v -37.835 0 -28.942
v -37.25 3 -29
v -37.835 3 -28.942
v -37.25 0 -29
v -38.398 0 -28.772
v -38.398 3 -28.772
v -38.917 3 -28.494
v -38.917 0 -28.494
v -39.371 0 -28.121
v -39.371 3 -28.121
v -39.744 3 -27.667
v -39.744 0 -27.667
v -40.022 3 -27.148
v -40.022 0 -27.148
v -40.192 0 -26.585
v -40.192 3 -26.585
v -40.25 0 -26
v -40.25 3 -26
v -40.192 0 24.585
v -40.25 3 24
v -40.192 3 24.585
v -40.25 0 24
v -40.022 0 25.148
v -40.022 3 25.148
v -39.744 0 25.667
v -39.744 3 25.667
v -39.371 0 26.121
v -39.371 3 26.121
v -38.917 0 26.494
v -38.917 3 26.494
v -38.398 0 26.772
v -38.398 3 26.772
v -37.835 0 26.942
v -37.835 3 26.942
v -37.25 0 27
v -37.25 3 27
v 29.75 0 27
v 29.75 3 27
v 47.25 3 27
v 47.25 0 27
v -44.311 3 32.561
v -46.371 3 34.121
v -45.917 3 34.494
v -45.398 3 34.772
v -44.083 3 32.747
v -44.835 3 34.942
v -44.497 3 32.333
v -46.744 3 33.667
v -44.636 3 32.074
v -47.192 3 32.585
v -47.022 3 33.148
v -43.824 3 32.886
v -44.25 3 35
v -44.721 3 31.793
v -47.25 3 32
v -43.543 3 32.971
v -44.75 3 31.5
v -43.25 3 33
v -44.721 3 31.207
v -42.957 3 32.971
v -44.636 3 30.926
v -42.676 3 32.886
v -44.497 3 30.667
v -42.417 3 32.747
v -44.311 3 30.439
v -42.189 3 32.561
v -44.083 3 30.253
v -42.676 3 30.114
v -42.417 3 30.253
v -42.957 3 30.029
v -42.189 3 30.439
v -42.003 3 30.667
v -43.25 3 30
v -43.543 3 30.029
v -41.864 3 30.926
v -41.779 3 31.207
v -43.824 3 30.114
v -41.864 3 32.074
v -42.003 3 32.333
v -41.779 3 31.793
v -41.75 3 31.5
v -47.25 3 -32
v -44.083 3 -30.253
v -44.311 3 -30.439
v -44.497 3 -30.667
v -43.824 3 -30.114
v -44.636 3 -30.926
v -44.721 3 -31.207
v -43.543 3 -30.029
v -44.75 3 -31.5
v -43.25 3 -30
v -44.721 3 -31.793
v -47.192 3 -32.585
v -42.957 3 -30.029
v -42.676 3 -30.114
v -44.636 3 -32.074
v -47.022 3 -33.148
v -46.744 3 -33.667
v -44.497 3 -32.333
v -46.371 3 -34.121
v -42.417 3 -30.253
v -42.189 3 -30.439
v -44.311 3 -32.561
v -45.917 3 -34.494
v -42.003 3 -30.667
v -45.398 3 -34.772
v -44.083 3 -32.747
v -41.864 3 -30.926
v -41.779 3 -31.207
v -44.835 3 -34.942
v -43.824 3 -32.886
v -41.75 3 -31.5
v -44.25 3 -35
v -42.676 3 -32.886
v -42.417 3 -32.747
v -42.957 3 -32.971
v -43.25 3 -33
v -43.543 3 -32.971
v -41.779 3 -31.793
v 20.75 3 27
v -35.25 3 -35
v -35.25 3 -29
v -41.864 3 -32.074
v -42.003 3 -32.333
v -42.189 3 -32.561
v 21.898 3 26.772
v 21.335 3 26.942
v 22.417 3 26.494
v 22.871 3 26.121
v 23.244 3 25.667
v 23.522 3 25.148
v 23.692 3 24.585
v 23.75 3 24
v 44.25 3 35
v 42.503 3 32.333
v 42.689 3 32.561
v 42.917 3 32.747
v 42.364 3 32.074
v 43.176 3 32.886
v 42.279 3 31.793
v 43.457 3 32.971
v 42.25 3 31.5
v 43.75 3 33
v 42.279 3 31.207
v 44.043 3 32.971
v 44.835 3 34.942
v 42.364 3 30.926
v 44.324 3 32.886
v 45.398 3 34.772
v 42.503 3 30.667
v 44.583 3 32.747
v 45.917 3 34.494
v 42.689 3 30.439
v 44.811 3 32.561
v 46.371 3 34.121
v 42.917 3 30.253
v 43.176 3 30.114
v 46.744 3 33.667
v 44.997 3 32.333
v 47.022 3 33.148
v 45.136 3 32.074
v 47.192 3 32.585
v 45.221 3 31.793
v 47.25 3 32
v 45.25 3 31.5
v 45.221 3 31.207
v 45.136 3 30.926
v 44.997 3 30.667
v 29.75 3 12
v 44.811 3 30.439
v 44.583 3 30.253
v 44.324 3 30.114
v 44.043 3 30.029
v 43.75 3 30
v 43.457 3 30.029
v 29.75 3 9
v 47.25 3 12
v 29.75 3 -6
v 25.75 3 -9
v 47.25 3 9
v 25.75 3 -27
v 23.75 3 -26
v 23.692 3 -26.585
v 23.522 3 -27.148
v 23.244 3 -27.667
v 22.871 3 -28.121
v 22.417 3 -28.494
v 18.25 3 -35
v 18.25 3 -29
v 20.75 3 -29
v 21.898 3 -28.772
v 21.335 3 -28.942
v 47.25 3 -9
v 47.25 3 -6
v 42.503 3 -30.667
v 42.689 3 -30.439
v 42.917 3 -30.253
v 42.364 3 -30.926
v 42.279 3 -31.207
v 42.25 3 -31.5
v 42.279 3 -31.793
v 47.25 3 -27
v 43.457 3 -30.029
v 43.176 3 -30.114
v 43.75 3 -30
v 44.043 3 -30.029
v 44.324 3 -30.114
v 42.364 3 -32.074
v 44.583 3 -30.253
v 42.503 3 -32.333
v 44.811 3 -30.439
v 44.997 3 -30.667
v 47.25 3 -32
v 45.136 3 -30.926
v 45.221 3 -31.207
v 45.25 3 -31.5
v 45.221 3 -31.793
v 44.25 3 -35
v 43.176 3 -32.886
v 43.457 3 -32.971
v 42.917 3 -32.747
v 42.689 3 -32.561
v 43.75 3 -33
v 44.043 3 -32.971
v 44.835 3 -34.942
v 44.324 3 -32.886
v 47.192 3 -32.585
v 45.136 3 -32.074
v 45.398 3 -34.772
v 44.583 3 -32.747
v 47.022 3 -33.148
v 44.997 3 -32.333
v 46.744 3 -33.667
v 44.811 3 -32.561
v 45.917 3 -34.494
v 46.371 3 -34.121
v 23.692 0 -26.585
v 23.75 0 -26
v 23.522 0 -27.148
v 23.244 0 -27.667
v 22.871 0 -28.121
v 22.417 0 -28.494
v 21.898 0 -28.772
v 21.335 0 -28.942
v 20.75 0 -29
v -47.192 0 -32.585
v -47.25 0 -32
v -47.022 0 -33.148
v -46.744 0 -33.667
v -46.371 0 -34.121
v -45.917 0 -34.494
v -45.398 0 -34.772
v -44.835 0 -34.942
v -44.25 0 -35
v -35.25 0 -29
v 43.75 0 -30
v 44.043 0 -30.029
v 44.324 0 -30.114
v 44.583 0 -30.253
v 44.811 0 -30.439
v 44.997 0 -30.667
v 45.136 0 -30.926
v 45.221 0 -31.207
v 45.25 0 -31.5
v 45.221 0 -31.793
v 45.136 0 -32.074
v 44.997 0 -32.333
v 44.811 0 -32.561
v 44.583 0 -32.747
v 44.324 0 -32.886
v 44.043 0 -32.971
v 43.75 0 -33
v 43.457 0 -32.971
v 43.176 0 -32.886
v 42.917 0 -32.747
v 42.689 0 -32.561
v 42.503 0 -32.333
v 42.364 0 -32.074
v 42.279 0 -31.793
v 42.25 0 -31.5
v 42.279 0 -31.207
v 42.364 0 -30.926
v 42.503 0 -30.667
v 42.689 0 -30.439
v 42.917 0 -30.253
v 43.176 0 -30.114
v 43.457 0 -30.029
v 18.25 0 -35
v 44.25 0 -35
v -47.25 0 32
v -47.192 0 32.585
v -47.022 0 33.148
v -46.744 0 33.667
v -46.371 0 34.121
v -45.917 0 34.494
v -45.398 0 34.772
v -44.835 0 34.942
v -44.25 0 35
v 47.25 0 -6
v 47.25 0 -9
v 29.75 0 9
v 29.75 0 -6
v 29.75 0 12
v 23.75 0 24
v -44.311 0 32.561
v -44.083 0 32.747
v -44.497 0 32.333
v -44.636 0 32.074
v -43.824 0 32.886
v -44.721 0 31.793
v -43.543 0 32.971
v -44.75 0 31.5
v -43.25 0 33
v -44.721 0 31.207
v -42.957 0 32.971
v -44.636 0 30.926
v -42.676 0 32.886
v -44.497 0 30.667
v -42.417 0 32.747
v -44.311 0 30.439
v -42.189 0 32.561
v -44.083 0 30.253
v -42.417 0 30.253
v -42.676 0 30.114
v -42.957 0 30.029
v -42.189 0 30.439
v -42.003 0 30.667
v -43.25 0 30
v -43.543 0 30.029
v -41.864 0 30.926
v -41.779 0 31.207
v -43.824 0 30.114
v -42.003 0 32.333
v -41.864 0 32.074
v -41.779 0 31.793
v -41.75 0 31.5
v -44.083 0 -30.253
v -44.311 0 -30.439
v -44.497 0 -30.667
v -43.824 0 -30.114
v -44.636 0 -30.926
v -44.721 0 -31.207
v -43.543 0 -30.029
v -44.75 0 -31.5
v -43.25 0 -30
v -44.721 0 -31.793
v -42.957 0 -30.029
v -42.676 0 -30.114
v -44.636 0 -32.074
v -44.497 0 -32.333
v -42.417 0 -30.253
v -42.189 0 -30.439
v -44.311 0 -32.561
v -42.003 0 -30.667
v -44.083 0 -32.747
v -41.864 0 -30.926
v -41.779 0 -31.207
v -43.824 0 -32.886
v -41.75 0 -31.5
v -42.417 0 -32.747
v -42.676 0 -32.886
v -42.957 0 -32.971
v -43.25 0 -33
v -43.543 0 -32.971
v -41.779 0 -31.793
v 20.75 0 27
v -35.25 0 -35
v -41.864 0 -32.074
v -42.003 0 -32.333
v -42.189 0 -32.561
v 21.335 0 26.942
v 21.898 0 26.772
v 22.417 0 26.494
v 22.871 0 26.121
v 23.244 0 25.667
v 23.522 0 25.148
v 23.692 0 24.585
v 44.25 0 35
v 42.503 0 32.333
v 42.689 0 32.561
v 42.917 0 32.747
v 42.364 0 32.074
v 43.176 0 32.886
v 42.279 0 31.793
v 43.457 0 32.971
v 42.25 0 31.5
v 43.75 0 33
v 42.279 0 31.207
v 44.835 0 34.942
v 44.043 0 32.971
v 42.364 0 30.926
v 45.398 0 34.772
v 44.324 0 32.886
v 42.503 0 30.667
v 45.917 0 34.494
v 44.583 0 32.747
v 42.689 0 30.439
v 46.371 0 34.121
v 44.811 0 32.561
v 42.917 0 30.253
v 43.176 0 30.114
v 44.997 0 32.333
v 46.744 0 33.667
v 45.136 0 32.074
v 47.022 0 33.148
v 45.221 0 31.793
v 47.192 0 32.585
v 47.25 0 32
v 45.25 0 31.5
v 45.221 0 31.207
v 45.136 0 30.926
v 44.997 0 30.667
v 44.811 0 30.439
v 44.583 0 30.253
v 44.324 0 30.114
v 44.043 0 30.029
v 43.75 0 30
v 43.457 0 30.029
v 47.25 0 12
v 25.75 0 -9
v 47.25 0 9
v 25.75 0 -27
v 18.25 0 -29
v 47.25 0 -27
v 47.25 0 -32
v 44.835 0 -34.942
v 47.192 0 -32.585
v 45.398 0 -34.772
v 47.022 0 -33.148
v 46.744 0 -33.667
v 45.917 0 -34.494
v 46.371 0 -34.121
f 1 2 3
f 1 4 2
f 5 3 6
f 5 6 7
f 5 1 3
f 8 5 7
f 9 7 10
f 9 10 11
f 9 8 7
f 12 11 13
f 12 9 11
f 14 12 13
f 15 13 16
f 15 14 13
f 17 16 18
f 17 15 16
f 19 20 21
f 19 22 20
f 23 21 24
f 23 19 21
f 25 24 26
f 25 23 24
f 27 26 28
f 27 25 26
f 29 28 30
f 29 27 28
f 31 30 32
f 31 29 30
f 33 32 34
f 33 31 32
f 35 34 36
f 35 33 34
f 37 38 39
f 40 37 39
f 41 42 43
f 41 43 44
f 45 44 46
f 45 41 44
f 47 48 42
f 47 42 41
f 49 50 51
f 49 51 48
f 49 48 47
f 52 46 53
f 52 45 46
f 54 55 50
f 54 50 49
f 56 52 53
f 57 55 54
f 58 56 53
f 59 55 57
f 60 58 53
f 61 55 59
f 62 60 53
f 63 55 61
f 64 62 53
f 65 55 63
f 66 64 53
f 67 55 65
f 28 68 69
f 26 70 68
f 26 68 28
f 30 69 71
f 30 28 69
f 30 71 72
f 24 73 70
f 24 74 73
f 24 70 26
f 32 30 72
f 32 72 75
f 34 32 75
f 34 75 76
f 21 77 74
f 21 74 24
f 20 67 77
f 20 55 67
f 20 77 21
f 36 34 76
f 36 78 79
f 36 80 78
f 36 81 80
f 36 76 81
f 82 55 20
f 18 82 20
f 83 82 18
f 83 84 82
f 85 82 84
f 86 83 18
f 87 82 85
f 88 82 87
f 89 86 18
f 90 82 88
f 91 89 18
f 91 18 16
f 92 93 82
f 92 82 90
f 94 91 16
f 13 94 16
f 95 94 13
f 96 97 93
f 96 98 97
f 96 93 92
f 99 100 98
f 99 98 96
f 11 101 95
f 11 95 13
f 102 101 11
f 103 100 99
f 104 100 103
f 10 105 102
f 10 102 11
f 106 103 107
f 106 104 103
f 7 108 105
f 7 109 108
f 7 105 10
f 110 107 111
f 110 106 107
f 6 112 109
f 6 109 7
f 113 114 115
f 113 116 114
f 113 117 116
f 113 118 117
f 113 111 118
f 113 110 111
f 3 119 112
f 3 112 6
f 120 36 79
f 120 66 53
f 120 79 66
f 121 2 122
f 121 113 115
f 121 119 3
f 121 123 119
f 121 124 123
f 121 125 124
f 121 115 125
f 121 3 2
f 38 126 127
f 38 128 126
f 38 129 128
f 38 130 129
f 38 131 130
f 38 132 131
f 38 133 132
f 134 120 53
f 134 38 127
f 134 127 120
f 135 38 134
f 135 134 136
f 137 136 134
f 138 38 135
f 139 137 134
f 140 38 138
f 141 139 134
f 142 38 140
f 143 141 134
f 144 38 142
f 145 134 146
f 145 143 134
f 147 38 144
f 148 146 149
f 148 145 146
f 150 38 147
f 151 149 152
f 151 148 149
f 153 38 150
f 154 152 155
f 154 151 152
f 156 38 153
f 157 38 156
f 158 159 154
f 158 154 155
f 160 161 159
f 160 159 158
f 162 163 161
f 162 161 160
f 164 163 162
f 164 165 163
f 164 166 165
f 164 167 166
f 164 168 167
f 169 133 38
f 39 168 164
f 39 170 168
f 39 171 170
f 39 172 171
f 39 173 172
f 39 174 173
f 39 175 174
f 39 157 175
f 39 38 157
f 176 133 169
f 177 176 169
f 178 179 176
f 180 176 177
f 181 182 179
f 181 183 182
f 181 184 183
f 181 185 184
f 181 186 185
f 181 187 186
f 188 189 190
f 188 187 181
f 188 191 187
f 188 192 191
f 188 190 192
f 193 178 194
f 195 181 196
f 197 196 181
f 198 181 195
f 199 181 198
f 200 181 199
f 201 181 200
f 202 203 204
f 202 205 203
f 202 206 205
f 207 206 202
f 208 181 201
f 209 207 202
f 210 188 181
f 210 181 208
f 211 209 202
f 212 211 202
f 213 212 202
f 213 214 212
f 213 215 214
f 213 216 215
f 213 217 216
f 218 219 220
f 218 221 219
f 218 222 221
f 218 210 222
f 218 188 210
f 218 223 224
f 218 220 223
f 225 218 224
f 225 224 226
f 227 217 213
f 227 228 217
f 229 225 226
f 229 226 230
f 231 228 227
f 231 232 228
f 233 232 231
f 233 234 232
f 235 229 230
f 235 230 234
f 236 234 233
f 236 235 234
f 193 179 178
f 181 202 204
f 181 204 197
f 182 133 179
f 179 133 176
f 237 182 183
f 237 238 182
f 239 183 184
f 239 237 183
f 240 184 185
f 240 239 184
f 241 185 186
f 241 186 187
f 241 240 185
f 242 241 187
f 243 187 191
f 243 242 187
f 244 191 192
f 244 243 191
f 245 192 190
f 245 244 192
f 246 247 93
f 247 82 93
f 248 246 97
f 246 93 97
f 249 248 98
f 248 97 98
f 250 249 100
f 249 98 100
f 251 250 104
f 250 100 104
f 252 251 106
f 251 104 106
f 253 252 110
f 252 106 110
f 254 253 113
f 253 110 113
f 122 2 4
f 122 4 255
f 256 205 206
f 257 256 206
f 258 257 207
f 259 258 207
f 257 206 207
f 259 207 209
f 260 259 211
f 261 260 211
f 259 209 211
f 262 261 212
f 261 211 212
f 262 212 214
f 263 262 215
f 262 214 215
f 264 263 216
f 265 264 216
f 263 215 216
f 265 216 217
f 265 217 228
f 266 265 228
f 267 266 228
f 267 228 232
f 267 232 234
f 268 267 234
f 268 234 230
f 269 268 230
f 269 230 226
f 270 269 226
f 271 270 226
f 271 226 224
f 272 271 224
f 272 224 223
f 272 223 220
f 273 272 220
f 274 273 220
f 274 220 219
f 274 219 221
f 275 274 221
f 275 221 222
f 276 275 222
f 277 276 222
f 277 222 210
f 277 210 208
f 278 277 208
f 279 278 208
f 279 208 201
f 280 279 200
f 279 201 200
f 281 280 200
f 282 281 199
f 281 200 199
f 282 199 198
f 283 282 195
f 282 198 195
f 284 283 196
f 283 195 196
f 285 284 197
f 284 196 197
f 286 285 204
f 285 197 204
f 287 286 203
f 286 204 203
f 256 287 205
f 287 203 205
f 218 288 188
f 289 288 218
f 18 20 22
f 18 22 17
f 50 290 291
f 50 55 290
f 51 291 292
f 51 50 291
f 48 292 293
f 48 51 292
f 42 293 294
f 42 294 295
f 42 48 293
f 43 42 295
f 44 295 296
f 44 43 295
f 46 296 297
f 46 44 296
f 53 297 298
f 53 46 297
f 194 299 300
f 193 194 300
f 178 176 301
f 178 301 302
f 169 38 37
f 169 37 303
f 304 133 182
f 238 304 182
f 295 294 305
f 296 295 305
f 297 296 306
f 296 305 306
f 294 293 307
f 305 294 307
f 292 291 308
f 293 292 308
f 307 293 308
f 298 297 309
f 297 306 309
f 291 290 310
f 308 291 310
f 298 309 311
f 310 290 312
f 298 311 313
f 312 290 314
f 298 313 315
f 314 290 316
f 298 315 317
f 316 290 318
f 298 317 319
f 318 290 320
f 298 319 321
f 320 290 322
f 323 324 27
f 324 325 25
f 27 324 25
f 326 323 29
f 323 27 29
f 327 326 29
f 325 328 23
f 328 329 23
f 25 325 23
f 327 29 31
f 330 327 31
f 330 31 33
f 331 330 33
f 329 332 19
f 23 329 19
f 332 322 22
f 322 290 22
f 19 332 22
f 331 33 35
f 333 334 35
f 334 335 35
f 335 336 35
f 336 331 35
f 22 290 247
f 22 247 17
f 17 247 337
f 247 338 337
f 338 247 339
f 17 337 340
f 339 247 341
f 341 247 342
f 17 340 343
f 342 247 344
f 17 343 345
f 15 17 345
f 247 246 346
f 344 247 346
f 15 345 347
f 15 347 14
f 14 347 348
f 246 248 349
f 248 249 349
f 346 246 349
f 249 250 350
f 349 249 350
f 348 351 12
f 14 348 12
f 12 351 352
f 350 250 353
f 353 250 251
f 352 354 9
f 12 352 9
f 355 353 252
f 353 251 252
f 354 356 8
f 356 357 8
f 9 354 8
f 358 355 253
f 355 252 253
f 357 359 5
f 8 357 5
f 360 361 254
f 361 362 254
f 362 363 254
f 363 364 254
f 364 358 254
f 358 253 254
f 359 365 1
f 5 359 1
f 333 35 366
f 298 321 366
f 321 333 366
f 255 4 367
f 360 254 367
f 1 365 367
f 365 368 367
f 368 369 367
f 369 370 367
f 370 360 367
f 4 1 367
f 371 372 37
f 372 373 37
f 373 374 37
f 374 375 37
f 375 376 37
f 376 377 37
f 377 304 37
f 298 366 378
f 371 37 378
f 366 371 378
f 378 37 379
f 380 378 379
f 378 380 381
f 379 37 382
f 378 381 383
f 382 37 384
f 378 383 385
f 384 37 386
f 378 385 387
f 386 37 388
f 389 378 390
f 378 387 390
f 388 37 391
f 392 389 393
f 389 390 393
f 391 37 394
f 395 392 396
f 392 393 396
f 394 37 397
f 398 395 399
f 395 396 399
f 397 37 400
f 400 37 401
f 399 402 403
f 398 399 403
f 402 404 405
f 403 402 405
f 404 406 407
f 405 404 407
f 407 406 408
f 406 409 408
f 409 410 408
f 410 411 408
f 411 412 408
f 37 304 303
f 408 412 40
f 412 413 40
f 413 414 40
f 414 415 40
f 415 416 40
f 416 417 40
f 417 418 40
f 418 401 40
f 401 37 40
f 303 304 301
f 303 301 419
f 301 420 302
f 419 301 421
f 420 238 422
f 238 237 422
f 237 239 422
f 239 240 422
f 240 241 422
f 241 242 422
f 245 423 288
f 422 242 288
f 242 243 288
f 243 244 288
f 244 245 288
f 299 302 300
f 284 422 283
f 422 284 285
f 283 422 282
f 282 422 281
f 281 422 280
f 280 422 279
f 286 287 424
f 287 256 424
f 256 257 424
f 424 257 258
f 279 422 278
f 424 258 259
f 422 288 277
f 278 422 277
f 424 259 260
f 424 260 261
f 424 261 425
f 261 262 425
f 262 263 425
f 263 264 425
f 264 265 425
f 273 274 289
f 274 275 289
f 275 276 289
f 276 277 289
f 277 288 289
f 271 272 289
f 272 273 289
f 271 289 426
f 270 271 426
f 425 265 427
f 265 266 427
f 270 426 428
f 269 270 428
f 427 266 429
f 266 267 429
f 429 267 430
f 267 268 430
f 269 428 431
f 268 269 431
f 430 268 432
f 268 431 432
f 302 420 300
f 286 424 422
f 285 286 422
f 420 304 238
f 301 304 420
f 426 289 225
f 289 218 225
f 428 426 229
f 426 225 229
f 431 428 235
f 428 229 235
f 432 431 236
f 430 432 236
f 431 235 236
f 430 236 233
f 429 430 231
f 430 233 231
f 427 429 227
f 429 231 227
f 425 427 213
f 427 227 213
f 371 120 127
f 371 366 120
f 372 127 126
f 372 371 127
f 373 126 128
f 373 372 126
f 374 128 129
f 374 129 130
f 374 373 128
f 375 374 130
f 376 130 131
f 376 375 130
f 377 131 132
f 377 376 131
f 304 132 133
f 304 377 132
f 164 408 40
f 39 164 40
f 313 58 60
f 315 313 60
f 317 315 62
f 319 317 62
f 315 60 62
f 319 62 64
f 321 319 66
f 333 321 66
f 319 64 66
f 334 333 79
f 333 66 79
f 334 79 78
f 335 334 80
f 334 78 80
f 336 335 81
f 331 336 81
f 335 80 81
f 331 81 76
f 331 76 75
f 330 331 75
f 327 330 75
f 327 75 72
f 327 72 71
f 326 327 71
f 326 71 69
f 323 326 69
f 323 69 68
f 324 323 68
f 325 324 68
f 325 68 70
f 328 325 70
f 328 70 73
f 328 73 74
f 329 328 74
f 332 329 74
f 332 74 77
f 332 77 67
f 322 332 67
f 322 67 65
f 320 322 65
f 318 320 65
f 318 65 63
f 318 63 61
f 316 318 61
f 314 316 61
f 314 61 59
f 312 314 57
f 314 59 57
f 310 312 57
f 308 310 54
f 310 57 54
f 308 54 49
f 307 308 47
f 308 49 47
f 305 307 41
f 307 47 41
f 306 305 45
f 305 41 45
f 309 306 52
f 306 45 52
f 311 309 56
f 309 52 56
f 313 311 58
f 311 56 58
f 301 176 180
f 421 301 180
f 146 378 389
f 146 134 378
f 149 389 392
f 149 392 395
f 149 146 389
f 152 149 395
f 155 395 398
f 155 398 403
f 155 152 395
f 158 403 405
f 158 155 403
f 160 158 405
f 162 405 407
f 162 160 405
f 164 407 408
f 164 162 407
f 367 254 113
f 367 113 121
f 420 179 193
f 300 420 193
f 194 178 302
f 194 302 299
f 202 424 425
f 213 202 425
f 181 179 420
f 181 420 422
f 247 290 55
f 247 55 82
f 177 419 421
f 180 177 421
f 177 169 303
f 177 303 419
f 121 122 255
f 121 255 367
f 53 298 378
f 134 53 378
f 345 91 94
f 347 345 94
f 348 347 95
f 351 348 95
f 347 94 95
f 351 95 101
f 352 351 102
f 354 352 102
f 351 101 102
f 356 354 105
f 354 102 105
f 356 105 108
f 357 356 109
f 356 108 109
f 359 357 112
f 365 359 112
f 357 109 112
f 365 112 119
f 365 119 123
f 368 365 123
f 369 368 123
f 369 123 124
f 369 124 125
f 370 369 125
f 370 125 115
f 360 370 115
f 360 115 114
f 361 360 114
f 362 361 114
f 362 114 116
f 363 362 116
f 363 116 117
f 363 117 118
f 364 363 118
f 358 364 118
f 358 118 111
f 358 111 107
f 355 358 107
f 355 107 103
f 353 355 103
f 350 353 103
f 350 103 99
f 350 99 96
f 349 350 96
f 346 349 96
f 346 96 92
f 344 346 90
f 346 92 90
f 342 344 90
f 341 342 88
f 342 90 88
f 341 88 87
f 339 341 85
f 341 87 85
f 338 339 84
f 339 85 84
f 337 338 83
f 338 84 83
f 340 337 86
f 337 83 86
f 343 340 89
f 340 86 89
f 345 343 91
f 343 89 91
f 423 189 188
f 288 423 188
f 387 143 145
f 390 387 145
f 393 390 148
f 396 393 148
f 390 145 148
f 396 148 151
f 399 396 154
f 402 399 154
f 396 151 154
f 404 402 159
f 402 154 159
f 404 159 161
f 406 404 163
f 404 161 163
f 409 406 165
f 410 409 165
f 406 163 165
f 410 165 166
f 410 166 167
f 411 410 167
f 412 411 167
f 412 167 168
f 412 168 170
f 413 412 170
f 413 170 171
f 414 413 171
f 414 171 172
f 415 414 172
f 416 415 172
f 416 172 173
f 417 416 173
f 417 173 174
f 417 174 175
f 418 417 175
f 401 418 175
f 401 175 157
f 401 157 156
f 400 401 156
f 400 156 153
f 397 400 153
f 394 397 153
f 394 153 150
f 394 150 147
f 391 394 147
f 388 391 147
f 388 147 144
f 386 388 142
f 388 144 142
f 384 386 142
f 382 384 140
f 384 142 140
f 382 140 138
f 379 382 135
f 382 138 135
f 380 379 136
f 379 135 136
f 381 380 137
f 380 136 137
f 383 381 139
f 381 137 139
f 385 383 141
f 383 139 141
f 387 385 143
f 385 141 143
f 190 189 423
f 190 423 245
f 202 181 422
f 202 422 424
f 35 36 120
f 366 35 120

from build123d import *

# Parameters (mm, degrees)
SKETCH1_W           = 94.5
SKETCH1_H           = 70
BOSS_EXTRUDE1_DEPTH = 3
SKETCH3_R           = 1.5
CUT_EXTRUDE2_DEPTH  = 59.877521177
FILLET2_R           = 3
SKETCH5_W           = 64
SKETCH5_H           = 56
SKETCH5_W_2         = 53.5
SKETCH5_H_2         = 6
SKETCH5_W_3         = 21.5
SKETCH5_H_3         = 18
SKETCH5_W_4         = 17.5
SKETCH5_H_4         = 15
CUT_EXTRUDE3_DEPTH  = 59.877521177
FILLET3_R           = 3


with BuildPart() as part:
    # Sketch1 → Boss-Extrude1 (new body)
    with BuildSketch(Plane(origin=(0, 0, 0), x_dir=(1, 0, 0), z_dir=(0, 1, 0))):
        Rectangle(SKETCH1_W, SKETCH1_H)
    extrude(amount=BOSS_EXTRUDE1_DEPTH)

    # Sketch3 → Cut-Extrude2 (cut, through all)
    with BuildSketch(Plane(origin=(0, 3, 0), x_dir=(1, 0, 0), z_dir=(0, 1, 0))):
        with Locations(Location((43.75, 31.5, 0), (0, 0, 270))):
            Circle(SKETCH3_R)
        with Locations(Location((-43.25, 31.5, 0), (0, 0, 270))):
            Circle(SKETCH3_R)
        with Locations(Location((-43.25, -31.5, 0), (0, 0, 270))):
            Circle(SKETCH3_R)
        with Locations(Location((43.75, -31.5, 0), (0, 0, 270))):
            Circle(SKETCH3_R)
    extrude(amount=-CUT_EXTRUDE2_DEPTH, mode=Mode.SUBTRACT)

    # Fillet2
    fillet2_edges = [part.edges().sort_by_distance(p)[0] for p in [
        (47.25, 1.5, 35),
        (-47.25, 1.5, 35),
        (-47.25, 1.5, -35),
        (47.25, 1.5, -35),
    ]]
    fillet(fillet2_edges, radius=FILLET2_R)

    # Sketch5 → Cut-Extrude3 (cut, through all)
    with BuildSketch(Plane(origin=(0, 3, 0), x_dir=(1, 0, 0), z_dir=(0, 1, 0))):
        with Locations((-8.25, 1)):
            Rectangle(SKETCH5_W, SKETCH5_H)
        with Locations((-8.5, 32)):
            Rectangle(SKETCH5_W_2, SKETCH5_H_2)
        with Locations((36.5, 18)):
            Rectangle(SKETCH5_W_3, SKETCH5_H_3)
        with Locations((38.5, -1.5)):
            Rectangle(SKETCH5_W_4, SKETCH5_H_4)
        with Locations((38.5, -19.5)):
            Rectangle(SKETCH5_W_4, SKETCH5_H_4)
    extrude(amount=-CUT_EXTRUDE3_DEPTH, mode=Mode.SUBTRACT)

    # Fillet3
    fillet3_edges = [part.edges().sort_by_distance(p)[0] for p in [
        (-40.25, 1.5, 27),
        (-40.25, 1.5, -29),
        (23.75, 1.5, -29),
        (23.75, 1.5, 27),
    ]]
    fillet(fillet3_edges, radius=FILLET3_R)


solid = part.part
